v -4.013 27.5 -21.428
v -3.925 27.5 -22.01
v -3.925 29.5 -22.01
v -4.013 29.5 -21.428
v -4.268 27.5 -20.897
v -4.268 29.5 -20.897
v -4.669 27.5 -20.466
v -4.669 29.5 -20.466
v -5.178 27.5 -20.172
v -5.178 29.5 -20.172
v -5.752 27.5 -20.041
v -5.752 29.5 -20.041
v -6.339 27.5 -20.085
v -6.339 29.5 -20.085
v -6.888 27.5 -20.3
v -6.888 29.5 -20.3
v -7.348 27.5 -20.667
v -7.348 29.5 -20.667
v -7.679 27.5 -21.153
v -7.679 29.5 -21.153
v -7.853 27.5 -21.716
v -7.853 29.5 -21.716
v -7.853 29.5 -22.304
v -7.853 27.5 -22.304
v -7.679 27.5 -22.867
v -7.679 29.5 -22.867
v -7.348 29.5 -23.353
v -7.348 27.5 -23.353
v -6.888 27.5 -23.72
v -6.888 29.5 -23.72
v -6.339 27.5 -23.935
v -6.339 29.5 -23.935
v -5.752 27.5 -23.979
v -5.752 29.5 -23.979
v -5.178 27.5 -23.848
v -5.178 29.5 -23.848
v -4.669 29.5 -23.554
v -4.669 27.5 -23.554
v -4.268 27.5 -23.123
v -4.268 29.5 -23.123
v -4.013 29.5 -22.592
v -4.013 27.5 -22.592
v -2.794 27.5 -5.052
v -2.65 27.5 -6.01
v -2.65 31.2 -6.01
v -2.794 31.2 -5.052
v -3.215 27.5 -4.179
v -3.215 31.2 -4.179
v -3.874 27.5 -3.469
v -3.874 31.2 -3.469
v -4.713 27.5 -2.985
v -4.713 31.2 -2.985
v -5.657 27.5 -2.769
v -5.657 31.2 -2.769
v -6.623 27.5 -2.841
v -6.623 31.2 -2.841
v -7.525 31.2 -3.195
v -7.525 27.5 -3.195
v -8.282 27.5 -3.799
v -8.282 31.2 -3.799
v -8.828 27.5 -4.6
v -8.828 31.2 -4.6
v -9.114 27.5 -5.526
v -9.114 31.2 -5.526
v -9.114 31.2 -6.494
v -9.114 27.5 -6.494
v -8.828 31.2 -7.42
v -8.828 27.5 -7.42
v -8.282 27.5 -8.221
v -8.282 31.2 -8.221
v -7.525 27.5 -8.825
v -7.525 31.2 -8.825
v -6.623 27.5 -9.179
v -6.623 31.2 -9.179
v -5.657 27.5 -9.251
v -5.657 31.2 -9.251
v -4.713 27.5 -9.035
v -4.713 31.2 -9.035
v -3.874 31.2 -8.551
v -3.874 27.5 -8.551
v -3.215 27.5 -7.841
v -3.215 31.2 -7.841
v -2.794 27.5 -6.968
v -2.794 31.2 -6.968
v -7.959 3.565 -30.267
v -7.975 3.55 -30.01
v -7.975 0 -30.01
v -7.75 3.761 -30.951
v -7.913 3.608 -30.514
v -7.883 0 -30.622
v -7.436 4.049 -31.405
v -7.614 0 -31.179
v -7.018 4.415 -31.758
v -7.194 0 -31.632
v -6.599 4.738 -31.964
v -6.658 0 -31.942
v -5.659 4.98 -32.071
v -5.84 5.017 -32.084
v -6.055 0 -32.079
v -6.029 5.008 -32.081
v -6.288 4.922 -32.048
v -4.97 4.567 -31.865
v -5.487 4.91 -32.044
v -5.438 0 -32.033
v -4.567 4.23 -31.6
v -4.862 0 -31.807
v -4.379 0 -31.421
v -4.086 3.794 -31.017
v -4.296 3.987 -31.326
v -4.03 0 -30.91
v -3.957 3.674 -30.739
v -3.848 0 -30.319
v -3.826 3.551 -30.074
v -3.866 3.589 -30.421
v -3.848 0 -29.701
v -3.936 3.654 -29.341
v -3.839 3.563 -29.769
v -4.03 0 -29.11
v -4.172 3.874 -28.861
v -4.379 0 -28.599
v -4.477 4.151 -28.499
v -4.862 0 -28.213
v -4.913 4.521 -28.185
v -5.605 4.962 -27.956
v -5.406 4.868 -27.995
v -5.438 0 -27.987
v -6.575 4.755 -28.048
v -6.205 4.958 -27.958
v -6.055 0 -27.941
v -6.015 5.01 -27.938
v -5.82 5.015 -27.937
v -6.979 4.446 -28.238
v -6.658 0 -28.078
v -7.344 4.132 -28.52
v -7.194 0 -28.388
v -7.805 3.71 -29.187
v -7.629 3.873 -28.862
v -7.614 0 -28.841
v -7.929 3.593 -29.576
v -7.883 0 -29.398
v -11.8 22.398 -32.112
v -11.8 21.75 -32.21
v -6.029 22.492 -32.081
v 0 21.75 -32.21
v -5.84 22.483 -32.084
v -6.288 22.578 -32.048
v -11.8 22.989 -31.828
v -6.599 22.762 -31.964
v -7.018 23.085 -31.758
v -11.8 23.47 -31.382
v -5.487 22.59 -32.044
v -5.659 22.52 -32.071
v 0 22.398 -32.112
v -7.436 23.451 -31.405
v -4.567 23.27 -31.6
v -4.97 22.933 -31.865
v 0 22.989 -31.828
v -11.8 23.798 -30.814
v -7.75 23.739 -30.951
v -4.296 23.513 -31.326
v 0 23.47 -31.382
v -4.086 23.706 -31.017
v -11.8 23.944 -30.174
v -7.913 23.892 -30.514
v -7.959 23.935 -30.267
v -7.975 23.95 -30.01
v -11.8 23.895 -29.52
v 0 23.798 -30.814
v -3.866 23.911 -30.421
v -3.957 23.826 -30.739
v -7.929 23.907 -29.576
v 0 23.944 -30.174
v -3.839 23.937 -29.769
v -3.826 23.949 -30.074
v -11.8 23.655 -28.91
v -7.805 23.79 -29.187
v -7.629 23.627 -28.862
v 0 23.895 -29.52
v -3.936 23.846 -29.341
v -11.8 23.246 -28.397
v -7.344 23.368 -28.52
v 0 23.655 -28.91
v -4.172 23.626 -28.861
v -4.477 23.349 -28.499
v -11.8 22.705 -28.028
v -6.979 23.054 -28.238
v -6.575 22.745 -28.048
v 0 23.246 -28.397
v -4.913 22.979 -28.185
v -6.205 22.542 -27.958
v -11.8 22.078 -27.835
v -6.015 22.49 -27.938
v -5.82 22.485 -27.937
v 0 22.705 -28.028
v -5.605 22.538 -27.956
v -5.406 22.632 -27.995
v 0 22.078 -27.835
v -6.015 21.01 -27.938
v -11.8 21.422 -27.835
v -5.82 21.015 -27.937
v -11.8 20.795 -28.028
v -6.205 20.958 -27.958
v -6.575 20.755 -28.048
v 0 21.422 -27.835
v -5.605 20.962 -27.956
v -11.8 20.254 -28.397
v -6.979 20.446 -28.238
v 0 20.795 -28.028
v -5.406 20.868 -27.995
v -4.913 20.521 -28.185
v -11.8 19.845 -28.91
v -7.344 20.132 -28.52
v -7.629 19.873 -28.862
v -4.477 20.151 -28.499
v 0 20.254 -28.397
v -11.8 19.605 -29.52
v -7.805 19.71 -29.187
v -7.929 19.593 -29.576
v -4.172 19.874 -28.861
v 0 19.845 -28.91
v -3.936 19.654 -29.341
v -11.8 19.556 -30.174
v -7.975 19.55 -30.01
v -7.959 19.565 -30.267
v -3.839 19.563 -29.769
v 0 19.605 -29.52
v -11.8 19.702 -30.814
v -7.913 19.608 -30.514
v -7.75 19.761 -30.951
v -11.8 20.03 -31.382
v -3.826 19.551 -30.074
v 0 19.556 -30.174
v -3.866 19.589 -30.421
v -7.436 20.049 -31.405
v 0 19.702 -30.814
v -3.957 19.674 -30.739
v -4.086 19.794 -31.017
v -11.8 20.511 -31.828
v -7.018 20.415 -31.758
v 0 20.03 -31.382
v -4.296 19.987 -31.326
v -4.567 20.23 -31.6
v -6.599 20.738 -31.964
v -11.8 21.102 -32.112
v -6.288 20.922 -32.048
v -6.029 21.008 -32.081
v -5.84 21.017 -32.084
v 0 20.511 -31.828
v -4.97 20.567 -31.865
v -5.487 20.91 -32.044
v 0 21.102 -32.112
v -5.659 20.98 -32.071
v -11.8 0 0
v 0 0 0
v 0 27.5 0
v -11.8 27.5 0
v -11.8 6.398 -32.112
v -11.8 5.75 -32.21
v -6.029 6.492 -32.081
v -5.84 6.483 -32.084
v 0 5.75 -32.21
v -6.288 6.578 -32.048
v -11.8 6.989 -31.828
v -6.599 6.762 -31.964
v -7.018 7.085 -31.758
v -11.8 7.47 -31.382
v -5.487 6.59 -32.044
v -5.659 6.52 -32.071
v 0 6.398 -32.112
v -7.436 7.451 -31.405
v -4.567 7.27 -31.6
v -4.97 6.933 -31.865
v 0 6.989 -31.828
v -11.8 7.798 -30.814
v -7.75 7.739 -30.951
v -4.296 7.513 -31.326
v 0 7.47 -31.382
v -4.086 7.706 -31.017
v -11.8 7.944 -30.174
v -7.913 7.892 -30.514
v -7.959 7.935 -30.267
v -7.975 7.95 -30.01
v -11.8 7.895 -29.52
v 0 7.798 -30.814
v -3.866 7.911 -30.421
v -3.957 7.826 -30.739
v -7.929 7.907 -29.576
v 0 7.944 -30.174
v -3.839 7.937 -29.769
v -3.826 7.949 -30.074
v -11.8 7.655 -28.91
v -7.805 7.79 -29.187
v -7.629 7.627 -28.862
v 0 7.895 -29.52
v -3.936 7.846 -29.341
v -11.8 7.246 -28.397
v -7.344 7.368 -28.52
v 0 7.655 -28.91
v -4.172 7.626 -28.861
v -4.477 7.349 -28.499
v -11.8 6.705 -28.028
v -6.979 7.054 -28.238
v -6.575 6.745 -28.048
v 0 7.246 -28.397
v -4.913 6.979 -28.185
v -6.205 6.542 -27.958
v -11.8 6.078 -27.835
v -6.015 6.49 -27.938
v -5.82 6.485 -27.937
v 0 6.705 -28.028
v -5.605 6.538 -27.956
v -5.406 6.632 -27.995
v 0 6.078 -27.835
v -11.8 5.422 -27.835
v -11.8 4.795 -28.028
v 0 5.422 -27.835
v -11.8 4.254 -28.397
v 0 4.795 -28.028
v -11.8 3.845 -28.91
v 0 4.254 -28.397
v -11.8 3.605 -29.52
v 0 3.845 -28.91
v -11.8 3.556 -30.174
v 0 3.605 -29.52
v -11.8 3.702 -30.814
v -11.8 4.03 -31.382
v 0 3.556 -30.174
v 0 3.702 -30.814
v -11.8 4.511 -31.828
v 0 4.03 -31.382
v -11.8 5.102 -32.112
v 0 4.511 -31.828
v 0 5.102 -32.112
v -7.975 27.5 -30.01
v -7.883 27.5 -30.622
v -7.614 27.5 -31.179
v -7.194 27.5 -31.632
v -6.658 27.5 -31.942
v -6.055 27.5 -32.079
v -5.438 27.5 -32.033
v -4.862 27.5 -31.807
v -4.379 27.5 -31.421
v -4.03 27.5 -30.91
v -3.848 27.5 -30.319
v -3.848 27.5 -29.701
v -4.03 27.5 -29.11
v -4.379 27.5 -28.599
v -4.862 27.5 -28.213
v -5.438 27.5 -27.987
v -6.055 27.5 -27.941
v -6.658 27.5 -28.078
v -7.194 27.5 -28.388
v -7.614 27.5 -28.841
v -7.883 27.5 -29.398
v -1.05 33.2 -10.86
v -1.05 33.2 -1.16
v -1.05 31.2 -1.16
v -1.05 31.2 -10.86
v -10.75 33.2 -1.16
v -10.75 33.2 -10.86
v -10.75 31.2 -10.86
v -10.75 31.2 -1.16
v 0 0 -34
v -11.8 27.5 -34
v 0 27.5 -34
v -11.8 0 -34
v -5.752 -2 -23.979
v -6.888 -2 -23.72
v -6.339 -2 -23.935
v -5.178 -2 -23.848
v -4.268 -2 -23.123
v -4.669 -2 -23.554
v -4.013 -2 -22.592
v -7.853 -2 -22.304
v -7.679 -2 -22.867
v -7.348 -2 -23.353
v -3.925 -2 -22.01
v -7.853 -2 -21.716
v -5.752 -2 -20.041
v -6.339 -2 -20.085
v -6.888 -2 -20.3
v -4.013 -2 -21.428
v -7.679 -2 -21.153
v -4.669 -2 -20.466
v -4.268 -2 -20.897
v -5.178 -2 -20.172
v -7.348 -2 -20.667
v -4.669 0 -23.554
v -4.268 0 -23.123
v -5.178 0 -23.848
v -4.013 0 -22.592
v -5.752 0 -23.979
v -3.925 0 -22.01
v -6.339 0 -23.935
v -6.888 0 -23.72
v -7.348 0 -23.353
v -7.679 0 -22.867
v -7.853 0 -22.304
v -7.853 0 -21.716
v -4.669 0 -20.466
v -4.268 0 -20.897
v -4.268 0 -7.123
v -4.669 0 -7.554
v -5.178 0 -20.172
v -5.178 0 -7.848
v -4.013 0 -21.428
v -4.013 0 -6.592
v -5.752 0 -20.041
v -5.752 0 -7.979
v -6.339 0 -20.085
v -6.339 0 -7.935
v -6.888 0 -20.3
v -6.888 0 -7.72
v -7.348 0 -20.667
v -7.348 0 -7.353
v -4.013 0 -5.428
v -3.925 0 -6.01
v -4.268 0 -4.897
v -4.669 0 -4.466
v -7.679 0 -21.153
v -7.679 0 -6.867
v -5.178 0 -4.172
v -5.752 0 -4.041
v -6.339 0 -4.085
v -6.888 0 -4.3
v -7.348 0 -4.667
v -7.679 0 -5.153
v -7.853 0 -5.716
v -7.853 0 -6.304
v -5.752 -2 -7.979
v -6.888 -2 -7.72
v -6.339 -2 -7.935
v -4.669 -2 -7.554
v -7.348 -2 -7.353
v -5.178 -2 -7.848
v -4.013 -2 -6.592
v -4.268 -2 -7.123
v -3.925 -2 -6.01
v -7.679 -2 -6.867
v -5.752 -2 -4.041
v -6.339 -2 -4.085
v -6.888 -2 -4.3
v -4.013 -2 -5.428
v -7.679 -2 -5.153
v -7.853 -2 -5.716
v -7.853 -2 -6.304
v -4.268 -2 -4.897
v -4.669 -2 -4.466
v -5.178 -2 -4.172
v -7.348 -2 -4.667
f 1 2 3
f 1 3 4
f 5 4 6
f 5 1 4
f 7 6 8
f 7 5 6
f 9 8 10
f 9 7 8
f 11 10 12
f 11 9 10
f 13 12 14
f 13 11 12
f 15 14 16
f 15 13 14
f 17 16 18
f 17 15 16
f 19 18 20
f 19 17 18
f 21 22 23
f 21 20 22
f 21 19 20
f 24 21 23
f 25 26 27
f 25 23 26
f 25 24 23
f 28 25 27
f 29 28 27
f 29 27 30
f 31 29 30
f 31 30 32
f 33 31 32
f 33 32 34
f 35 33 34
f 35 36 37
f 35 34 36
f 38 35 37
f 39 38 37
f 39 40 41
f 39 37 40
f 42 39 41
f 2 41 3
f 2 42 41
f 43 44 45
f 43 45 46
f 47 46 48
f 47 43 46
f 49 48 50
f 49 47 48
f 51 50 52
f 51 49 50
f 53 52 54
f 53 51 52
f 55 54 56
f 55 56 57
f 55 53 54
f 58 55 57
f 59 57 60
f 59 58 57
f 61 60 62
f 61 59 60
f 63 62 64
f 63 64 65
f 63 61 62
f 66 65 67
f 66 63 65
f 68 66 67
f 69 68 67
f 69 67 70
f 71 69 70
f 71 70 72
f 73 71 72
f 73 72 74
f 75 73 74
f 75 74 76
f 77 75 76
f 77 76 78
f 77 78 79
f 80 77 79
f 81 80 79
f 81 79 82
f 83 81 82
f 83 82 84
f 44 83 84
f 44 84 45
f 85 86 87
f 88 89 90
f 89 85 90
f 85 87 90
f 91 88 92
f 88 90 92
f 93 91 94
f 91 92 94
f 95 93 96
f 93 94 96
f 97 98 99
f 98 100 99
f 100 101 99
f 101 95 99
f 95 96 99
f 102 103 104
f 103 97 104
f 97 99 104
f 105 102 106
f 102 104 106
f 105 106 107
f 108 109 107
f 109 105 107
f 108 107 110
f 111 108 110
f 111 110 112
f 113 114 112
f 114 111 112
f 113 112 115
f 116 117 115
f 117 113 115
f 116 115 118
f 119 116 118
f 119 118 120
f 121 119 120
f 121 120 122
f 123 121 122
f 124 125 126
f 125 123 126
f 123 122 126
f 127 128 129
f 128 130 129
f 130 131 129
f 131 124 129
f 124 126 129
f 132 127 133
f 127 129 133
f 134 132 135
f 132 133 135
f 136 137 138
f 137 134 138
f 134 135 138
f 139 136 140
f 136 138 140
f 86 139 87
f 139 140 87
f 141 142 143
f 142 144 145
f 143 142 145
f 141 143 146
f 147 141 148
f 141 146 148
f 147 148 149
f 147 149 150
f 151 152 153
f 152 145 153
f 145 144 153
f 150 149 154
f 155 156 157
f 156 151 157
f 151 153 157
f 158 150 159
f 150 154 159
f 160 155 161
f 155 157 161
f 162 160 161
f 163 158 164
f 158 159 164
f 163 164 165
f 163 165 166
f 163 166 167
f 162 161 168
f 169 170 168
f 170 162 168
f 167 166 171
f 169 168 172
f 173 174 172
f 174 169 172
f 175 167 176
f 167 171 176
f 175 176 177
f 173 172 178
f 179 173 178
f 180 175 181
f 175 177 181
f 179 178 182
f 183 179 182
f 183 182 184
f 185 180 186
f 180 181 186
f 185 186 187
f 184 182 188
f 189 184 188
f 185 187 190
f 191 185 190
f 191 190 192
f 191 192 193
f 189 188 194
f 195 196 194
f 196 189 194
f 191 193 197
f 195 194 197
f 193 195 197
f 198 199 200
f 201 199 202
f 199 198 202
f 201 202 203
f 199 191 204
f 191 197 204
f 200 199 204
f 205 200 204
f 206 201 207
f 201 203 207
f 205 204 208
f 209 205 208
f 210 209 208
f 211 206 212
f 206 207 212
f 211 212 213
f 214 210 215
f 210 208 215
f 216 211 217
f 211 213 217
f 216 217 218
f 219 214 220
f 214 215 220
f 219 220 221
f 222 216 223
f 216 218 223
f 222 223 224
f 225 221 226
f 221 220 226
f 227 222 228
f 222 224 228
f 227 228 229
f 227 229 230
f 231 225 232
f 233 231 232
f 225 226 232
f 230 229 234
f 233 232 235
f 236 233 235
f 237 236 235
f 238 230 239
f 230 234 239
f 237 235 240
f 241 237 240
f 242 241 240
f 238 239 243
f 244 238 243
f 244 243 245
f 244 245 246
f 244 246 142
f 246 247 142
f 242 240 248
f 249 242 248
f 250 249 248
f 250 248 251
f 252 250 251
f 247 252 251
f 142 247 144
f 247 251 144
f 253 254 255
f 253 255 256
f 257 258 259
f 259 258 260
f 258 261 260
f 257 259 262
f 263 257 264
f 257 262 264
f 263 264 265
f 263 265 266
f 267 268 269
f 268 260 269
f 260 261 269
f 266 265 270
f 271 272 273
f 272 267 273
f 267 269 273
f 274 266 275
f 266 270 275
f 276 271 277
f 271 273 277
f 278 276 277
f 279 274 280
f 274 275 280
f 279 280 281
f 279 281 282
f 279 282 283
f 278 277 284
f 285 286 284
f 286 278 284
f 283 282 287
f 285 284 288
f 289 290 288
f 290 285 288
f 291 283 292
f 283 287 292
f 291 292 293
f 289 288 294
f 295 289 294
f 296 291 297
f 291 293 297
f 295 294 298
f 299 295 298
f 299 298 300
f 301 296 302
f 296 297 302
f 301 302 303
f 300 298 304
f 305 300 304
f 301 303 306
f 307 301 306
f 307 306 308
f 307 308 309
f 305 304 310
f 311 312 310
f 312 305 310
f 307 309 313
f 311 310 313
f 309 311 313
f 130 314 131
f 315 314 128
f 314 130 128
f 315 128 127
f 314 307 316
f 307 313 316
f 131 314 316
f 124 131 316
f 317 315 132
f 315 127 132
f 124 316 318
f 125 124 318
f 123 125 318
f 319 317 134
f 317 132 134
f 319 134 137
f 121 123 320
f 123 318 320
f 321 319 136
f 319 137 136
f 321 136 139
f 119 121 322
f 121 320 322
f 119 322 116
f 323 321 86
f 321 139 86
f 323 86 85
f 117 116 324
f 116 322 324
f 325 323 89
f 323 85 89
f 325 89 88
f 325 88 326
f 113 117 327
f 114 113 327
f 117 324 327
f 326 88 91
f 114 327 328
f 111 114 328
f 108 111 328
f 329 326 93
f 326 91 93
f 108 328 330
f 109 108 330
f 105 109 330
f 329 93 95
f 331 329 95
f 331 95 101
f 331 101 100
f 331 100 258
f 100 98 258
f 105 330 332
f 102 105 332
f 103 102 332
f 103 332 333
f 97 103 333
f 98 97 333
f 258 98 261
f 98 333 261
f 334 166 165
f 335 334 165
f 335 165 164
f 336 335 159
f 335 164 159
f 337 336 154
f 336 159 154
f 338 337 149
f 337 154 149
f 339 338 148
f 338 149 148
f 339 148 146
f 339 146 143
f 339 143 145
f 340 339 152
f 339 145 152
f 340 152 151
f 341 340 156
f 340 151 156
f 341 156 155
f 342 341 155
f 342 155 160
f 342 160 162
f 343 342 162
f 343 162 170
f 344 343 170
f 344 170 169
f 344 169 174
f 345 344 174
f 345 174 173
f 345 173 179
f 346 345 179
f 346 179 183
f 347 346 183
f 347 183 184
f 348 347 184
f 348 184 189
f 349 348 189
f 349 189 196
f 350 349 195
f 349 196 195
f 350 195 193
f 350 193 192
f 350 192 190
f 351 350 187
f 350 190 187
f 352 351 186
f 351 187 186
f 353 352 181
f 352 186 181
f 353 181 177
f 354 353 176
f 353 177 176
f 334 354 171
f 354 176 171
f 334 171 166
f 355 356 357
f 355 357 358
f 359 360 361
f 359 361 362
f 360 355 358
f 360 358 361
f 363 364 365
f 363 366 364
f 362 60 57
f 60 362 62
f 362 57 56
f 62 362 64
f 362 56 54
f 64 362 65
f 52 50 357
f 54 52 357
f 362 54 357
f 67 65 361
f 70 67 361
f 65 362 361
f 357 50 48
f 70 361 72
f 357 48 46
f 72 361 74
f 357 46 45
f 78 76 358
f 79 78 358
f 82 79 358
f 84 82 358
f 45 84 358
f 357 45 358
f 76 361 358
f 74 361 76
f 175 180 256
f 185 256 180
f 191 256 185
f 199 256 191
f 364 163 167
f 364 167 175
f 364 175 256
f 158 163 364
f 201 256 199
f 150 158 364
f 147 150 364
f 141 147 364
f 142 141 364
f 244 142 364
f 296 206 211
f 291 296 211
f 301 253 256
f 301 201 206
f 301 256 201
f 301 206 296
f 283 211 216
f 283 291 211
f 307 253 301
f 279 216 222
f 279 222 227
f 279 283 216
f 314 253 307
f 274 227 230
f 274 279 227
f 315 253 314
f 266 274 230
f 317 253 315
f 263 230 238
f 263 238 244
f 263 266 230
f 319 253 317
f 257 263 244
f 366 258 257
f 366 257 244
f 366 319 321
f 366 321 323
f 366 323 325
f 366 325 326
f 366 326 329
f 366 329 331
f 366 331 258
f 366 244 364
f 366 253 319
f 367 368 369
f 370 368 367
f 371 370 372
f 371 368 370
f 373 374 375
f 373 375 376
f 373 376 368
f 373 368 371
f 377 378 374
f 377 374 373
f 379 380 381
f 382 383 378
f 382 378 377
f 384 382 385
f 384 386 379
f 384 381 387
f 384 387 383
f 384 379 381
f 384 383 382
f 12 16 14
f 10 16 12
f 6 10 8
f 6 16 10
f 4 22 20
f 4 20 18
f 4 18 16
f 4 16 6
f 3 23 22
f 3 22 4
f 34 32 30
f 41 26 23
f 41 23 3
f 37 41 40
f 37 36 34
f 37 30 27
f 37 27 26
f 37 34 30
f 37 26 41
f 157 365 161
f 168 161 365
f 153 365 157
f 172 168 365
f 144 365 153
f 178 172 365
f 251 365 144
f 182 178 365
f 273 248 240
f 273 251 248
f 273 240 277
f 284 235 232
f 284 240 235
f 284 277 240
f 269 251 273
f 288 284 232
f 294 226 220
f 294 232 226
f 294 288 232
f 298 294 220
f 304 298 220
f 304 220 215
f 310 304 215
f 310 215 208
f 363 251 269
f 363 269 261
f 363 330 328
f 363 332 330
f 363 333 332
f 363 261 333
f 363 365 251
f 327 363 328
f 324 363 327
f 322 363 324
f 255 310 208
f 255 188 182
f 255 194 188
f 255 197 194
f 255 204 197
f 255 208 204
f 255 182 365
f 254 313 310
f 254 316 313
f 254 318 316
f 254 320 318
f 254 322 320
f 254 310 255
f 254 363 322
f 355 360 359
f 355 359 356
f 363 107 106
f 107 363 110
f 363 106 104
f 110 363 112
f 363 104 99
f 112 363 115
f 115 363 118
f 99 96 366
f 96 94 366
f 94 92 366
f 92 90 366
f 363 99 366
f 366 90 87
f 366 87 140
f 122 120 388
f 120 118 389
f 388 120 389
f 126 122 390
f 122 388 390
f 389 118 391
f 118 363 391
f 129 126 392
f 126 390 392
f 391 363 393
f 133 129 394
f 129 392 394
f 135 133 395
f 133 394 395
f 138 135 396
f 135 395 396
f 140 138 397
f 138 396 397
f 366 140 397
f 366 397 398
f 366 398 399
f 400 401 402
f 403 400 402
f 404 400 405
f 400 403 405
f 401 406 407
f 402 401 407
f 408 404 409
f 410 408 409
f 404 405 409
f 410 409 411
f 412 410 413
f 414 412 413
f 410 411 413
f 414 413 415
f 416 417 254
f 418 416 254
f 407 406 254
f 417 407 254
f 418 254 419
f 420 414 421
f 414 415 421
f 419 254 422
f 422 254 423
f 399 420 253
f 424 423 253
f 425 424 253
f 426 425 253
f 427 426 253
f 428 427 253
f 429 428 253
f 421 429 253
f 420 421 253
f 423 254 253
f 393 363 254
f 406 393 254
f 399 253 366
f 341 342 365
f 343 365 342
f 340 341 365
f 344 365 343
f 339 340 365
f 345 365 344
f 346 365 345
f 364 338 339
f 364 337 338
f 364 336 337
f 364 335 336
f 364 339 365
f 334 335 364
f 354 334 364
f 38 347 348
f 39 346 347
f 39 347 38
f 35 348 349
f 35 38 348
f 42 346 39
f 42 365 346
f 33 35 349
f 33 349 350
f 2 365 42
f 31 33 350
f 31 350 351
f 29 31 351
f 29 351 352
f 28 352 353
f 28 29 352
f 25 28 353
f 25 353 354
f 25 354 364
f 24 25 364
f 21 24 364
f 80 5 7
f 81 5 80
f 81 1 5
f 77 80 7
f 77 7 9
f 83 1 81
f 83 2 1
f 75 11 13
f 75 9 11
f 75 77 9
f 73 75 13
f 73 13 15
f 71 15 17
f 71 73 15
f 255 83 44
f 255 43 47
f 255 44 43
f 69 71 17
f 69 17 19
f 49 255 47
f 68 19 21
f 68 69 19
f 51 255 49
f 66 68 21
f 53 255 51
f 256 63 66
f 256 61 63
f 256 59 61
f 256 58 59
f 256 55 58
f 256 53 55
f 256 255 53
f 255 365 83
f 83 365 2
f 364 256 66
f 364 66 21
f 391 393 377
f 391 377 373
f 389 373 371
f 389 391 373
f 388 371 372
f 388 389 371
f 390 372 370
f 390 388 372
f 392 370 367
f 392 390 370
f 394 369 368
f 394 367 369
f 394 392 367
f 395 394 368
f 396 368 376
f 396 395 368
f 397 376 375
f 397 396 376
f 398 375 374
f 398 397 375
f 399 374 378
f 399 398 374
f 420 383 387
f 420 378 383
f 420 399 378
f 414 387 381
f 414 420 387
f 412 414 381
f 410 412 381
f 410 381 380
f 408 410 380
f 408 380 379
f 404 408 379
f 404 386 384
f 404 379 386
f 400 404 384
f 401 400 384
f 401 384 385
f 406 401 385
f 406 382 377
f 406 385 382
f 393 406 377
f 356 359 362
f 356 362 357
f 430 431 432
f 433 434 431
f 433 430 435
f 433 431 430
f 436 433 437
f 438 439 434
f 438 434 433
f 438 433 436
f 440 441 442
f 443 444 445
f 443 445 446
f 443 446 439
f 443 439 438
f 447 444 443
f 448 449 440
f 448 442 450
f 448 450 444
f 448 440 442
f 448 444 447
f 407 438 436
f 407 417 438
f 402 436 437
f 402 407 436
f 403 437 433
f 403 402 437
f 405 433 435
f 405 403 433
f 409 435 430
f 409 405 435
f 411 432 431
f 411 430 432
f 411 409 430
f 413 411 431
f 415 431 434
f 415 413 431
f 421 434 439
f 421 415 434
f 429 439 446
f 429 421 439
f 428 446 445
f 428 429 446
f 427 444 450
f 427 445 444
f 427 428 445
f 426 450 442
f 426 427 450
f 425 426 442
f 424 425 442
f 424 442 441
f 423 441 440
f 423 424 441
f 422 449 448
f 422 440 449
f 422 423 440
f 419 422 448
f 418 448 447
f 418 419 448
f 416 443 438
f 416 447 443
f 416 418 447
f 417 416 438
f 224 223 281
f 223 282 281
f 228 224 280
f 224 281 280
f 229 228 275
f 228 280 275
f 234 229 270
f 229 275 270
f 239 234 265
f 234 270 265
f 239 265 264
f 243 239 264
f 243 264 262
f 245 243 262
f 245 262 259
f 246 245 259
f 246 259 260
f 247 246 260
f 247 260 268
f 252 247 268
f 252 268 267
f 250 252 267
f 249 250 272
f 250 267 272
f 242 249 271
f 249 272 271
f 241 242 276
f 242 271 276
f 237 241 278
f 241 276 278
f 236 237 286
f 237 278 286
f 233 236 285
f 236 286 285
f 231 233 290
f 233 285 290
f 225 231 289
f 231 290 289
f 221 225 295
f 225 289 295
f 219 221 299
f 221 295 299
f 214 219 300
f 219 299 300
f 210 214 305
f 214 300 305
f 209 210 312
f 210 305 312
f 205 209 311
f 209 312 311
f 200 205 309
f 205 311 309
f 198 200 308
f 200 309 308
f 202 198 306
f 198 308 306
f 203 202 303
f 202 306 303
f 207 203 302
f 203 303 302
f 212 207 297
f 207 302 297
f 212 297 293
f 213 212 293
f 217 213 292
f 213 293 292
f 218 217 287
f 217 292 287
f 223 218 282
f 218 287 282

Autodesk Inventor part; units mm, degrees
ref_plane "YZ Plane" through (0, 0, 0) normal (1, 0, 0) x (0, 1, 0)
ref_plane "XZ Plane" through (0, 0, 0) normal (0, 1, 0) x (-1, 0, 0)
ref_plane "XY Plane" through (0, 0, 0) normal (0, 0, 1) x (1, 0, 0)
sketch "Sketch1" plane through (0, 0, 0) normal (0, 1, 0) x (-1, 0, 0)
  line L0 (0, 0) -> (11.8, 0)
  line L1 (11.8, 0) -> (11.8, -34)
  line L2 (11.8, -34) -> (0, -34)
  line L3 (0, -34) -> (0, 0)
  circle A0 centre (5.9, -30.01) radius 2.075
  dimension "d0" = 11.8
  dimension "d1" = 34
  dimension "d2" = 4.15
  dimension "d3" = 30.01
extrude "Extrusion1" add sketch "Sketch1" along normal blind 27.5
sketch "Sketch2" plane through (0, 27.5, 0) normal (0, 1, 0) x (1, 0, 0)
  circle A0 centre (-5.9, 6.01) radius 3.25
  line L0 (-11.8, 0) -> (0, 0) projected
  line L1 (0, 0) -> (0, 34) projected
  dimension "d6" = 6.5
  dimension "d7" = 6.01
  dimension "d8" = 5.9
extrude "Extrusion2" add sketch "Sketch2" along normal blind 5.7
sketch "Sketch3" plane through (-5.9, 33.2, -6.01) normal (0, 1, 0) x (1, 0, 0)
  line L0 (-4.85, -4.85) -> (4.85, -4.85)
  line L1 (4.85, -4.85) -> (4.85, 4.85)
  line L2 (4.85, 4.85) -> (-4.85, 4.85)
  line L3 (-4.85, 4.85) -> (-4.85, -4.85)
  line L4 (-4.85, -4.85) -> (4.85, 4.85) construction
  line L5 (4.85, -4.85) -> (-4.85, 4.85) construction
  point P0 (5.9, -6.01)
  point P1 (0, 0)
  dimension "d11" = 9.7
  dimension "d12" = 9.7
extrude "Extrusion3" add sketch "Sketch3" against normal blind 2
sketch "Sketch4" plane through (0, 0, 0) normal (0, -1, 0) x (1, 0, 0)
  circle A0 centre (-5.9, -6.01) radius 3.25 projected
  circle A1 centre (-5.9, -6.01) radius 1.975
  point P0 (0, 0)
  dimension "d24" = 3.95
extrude "Extrusion4" add sketch "Sketch4" along normal blind 2 contours A1
sketch "Sketch5" plane through (0, 27.5, 0) normal (0, 1, 0) x (1, 0, 0)
  circle A0 centre (-5.9, 22.01) radius 1.975
  circle A1 centre (-5.9, 30.01) radius 2.075 projected
  point P0 (0, 0)
  dimension "d27" = 3.95
  dimension "d28" = 8
extrude "Extrusion5" add sketch "Sketch5" along normal blind 2 contours A0
sketch "Sketch6" plane through (0, 0, 0) normal (0, -1, 0) x (1, 0, 0)
  circle A0 centre (-5.9, -22.01) radius 1.975 projected
  circle A1 centre (-5.9, -22.01) radius 1.975
  point P0 (0, 0)
extrude "Extrusion6" add sketch "Sketch6" along normal blind 2
sketch "Sketch7" plane through (0, 0, 0) normal (1, 0, 0) x (0, 0, -1)
  circle A0 centre (30.01, 21.75) radius 2.2
  circle A1 centre (30.01, 5.75) radius 2.2
  line L0 (0, 27.5) -> (34, 27.5) projected
  line L1 (0, 0) -> (34, 0) projected
  line L2 (34, 0) -> (34, 27.5) projected
  dimension "d53" = 4.4
  dimension "d54" = 4.4
  dimension "d55" = 16
  dimension "d57" = 5.75
  dimension "d60" = 3.99
  dimension "d61" = 3.99
extrude "Extrusion7" cut sketch "Sketch7" against normal blind 17.25
properties part number "MS-1.5A Servo"
